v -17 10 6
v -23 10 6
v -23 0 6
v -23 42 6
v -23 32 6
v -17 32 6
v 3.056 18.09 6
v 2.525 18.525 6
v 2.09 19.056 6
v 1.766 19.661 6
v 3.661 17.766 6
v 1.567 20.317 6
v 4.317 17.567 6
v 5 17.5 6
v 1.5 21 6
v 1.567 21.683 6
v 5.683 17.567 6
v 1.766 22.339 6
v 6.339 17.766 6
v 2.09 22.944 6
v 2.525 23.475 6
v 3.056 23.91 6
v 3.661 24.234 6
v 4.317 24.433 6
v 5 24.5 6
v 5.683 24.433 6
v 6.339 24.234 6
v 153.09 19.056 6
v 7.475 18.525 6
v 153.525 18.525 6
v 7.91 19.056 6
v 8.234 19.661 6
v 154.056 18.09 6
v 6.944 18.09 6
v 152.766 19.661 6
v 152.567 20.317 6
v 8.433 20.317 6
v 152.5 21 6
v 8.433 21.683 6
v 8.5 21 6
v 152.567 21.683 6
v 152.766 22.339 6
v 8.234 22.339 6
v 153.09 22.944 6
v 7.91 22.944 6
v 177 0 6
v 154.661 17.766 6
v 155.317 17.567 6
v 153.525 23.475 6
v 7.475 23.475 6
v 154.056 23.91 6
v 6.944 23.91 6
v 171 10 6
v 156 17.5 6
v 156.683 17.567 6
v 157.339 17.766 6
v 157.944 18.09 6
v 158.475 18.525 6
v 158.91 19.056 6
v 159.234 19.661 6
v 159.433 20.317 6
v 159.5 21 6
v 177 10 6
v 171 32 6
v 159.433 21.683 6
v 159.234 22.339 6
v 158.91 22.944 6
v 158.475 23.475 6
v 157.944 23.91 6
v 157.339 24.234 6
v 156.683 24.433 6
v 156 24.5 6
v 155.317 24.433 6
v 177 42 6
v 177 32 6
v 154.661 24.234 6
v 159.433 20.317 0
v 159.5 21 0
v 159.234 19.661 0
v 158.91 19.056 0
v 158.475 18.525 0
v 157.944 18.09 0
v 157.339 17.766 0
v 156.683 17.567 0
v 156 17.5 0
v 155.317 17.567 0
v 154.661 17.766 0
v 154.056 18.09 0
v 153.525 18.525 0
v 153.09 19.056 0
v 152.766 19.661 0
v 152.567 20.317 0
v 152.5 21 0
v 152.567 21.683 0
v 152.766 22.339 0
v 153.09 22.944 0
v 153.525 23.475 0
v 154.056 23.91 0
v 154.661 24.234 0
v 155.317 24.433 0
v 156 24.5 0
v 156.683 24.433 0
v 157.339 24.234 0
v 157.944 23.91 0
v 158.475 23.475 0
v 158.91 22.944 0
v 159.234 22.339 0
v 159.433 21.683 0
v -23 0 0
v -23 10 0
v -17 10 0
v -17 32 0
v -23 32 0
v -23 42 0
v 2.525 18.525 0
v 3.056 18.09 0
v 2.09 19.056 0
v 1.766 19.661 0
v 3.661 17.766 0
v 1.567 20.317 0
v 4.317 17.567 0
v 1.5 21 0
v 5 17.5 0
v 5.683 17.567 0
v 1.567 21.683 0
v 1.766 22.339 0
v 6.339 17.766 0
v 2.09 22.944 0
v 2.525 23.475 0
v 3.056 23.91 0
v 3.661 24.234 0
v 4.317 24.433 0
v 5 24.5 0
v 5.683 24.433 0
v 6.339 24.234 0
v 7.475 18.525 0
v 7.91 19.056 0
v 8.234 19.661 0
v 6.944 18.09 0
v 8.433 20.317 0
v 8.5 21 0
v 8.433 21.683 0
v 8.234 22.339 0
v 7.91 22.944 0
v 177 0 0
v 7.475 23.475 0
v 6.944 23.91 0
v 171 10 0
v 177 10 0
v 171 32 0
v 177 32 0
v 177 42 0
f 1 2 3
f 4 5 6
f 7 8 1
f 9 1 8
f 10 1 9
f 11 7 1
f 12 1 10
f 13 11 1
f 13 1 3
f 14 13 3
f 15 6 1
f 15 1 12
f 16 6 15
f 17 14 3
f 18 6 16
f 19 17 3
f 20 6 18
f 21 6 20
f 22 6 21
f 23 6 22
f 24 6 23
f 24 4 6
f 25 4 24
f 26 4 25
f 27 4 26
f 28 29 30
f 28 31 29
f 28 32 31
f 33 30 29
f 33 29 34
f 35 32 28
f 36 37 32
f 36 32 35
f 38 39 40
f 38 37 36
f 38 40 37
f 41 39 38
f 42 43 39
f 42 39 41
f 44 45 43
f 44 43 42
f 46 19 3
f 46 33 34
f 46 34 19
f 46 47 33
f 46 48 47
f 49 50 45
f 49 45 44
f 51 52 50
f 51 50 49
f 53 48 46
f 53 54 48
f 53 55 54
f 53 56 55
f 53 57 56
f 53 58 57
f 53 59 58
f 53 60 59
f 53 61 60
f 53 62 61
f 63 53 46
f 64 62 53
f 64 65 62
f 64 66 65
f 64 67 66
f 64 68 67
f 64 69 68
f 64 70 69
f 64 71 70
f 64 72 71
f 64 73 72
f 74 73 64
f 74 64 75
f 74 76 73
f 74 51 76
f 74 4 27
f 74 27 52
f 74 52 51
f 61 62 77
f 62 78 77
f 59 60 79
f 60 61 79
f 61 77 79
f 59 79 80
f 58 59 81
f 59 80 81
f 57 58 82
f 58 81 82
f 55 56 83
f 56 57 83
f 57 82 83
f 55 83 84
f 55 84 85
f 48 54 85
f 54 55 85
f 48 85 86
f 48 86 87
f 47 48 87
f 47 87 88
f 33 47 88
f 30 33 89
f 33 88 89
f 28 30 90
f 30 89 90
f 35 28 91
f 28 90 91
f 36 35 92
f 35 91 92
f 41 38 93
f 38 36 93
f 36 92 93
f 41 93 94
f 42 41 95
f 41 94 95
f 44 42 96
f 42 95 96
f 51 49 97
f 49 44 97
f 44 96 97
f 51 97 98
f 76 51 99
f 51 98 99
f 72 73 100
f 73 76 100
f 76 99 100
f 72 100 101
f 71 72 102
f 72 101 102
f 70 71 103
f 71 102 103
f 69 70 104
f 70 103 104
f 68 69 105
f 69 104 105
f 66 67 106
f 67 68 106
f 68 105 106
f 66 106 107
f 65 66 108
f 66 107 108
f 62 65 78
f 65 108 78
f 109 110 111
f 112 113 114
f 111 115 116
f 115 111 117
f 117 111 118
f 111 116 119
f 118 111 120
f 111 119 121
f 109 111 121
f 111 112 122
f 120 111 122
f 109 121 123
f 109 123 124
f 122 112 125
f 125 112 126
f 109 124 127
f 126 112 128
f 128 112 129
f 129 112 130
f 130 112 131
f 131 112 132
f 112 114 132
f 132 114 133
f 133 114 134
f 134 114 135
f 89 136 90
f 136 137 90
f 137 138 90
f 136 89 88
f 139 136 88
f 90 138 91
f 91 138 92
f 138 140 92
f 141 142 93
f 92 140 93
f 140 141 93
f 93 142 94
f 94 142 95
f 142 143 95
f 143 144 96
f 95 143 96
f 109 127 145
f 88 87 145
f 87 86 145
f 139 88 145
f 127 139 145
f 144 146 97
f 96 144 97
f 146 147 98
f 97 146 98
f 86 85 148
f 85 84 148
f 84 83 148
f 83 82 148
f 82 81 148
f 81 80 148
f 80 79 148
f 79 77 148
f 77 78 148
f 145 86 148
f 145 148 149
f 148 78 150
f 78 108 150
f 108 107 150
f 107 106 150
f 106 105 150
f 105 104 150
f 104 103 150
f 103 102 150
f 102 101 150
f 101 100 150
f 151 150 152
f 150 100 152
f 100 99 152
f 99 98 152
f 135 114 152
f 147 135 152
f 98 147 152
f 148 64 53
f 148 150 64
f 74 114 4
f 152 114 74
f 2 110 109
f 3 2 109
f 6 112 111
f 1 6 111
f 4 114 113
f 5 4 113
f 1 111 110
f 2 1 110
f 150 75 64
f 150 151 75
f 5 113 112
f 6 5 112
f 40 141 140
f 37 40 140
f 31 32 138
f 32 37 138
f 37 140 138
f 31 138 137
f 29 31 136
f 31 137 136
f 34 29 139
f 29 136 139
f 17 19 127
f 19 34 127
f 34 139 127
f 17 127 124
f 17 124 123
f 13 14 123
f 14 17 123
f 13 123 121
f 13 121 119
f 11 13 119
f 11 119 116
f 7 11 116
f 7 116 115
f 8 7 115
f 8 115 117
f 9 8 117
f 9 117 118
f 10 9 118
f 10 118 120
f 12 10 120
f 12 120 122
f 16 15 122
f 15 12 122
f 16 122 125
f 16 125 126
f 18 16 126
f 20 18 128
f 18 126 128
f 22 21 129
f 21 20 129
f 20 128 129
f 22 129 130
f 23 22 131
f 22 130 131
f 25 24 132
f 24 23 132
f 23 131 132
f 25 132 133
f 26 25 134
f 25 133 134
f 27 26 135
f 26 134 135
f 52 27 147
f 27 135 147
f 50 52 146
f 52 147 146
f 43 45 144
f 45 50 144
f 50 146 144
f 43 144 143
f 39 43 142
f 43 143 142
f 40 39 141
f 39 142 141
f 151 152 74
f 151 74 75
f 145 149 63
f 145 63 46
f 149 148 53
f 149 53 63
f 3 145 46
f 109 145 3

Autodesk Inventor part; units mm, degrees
ref_plane "YZ Plane" through (0, 0, 0) normal (1, 0, 0) x (0, 1, 0)
ref_plane "XZ Plane" through (0, 0, 0) normal (0, 1, 0) x (-1, 0, 0)
ref_plane "XY Plane" through (0, 0, 0) normal (0, 0, 1) x (1, 0, 0)
sketch "Sketch1" plane through (0, 0, 0) normal (0, 0, 1) x (1, 0, 0)
  line L0 (-23, 42) -> (177, 42)
  line L1 (177, 0) -> (-23, 0)
  line L2 (-63, 0) -> (217, 0) projected
  line L3 (-23, 42) -> (-23, 32)
  line L4 (-23, 32) -> (-17, 32)
  line L5 (-17, 32) -> (-17, 10)
  line L6 (-17, 10) -> (-23, 10)
  line L7 (-23, 10) -> (-23, 0)
  line L8 (177, 42) -> (177, 32)
  line L9 (177, 32) -> (171, 32)
  line L10 (171, 32) -> (171, 10)
  line L11 (171, 10) -> (177, 10)
  line L12 (177, 10) -> (177, 0)
  circle A0 centre (156, 21) radius 3.5
  circle A1 centre (5, 21) radius 3.5
  point P0 (0, 0)
  point P1 (0, 0)
  dimension "d31" = 200
  dimension "d35" = 6
  dimension "d36" = 10
  dimension "d37" = 10
  dimension "d38" = 23
  dimension "d39" = 10
  dimension "d40" = 10
  dimension "d41" = 6
  dimension "d42" = 7
  dimension "d43" = 15
  dimension "d44" = 21
  dimension "d45" = 42
  dimension "d46" = 10
  dimension "d47" = 7
  dimension "d48" = 21
  dimension "d49" = 28
extrude "Extrusion3" add sketch "Sketch1" along normal blind 6
equation "\"d37\" = d36"
equation "\"d39\" = d36"
equation "\"d40\" = d39"
equation "\"d41\" = d35"
equation "\"d47\" = d42"
equation "\"d48\" = d44"
properties part number "Tope riel motor 2"
